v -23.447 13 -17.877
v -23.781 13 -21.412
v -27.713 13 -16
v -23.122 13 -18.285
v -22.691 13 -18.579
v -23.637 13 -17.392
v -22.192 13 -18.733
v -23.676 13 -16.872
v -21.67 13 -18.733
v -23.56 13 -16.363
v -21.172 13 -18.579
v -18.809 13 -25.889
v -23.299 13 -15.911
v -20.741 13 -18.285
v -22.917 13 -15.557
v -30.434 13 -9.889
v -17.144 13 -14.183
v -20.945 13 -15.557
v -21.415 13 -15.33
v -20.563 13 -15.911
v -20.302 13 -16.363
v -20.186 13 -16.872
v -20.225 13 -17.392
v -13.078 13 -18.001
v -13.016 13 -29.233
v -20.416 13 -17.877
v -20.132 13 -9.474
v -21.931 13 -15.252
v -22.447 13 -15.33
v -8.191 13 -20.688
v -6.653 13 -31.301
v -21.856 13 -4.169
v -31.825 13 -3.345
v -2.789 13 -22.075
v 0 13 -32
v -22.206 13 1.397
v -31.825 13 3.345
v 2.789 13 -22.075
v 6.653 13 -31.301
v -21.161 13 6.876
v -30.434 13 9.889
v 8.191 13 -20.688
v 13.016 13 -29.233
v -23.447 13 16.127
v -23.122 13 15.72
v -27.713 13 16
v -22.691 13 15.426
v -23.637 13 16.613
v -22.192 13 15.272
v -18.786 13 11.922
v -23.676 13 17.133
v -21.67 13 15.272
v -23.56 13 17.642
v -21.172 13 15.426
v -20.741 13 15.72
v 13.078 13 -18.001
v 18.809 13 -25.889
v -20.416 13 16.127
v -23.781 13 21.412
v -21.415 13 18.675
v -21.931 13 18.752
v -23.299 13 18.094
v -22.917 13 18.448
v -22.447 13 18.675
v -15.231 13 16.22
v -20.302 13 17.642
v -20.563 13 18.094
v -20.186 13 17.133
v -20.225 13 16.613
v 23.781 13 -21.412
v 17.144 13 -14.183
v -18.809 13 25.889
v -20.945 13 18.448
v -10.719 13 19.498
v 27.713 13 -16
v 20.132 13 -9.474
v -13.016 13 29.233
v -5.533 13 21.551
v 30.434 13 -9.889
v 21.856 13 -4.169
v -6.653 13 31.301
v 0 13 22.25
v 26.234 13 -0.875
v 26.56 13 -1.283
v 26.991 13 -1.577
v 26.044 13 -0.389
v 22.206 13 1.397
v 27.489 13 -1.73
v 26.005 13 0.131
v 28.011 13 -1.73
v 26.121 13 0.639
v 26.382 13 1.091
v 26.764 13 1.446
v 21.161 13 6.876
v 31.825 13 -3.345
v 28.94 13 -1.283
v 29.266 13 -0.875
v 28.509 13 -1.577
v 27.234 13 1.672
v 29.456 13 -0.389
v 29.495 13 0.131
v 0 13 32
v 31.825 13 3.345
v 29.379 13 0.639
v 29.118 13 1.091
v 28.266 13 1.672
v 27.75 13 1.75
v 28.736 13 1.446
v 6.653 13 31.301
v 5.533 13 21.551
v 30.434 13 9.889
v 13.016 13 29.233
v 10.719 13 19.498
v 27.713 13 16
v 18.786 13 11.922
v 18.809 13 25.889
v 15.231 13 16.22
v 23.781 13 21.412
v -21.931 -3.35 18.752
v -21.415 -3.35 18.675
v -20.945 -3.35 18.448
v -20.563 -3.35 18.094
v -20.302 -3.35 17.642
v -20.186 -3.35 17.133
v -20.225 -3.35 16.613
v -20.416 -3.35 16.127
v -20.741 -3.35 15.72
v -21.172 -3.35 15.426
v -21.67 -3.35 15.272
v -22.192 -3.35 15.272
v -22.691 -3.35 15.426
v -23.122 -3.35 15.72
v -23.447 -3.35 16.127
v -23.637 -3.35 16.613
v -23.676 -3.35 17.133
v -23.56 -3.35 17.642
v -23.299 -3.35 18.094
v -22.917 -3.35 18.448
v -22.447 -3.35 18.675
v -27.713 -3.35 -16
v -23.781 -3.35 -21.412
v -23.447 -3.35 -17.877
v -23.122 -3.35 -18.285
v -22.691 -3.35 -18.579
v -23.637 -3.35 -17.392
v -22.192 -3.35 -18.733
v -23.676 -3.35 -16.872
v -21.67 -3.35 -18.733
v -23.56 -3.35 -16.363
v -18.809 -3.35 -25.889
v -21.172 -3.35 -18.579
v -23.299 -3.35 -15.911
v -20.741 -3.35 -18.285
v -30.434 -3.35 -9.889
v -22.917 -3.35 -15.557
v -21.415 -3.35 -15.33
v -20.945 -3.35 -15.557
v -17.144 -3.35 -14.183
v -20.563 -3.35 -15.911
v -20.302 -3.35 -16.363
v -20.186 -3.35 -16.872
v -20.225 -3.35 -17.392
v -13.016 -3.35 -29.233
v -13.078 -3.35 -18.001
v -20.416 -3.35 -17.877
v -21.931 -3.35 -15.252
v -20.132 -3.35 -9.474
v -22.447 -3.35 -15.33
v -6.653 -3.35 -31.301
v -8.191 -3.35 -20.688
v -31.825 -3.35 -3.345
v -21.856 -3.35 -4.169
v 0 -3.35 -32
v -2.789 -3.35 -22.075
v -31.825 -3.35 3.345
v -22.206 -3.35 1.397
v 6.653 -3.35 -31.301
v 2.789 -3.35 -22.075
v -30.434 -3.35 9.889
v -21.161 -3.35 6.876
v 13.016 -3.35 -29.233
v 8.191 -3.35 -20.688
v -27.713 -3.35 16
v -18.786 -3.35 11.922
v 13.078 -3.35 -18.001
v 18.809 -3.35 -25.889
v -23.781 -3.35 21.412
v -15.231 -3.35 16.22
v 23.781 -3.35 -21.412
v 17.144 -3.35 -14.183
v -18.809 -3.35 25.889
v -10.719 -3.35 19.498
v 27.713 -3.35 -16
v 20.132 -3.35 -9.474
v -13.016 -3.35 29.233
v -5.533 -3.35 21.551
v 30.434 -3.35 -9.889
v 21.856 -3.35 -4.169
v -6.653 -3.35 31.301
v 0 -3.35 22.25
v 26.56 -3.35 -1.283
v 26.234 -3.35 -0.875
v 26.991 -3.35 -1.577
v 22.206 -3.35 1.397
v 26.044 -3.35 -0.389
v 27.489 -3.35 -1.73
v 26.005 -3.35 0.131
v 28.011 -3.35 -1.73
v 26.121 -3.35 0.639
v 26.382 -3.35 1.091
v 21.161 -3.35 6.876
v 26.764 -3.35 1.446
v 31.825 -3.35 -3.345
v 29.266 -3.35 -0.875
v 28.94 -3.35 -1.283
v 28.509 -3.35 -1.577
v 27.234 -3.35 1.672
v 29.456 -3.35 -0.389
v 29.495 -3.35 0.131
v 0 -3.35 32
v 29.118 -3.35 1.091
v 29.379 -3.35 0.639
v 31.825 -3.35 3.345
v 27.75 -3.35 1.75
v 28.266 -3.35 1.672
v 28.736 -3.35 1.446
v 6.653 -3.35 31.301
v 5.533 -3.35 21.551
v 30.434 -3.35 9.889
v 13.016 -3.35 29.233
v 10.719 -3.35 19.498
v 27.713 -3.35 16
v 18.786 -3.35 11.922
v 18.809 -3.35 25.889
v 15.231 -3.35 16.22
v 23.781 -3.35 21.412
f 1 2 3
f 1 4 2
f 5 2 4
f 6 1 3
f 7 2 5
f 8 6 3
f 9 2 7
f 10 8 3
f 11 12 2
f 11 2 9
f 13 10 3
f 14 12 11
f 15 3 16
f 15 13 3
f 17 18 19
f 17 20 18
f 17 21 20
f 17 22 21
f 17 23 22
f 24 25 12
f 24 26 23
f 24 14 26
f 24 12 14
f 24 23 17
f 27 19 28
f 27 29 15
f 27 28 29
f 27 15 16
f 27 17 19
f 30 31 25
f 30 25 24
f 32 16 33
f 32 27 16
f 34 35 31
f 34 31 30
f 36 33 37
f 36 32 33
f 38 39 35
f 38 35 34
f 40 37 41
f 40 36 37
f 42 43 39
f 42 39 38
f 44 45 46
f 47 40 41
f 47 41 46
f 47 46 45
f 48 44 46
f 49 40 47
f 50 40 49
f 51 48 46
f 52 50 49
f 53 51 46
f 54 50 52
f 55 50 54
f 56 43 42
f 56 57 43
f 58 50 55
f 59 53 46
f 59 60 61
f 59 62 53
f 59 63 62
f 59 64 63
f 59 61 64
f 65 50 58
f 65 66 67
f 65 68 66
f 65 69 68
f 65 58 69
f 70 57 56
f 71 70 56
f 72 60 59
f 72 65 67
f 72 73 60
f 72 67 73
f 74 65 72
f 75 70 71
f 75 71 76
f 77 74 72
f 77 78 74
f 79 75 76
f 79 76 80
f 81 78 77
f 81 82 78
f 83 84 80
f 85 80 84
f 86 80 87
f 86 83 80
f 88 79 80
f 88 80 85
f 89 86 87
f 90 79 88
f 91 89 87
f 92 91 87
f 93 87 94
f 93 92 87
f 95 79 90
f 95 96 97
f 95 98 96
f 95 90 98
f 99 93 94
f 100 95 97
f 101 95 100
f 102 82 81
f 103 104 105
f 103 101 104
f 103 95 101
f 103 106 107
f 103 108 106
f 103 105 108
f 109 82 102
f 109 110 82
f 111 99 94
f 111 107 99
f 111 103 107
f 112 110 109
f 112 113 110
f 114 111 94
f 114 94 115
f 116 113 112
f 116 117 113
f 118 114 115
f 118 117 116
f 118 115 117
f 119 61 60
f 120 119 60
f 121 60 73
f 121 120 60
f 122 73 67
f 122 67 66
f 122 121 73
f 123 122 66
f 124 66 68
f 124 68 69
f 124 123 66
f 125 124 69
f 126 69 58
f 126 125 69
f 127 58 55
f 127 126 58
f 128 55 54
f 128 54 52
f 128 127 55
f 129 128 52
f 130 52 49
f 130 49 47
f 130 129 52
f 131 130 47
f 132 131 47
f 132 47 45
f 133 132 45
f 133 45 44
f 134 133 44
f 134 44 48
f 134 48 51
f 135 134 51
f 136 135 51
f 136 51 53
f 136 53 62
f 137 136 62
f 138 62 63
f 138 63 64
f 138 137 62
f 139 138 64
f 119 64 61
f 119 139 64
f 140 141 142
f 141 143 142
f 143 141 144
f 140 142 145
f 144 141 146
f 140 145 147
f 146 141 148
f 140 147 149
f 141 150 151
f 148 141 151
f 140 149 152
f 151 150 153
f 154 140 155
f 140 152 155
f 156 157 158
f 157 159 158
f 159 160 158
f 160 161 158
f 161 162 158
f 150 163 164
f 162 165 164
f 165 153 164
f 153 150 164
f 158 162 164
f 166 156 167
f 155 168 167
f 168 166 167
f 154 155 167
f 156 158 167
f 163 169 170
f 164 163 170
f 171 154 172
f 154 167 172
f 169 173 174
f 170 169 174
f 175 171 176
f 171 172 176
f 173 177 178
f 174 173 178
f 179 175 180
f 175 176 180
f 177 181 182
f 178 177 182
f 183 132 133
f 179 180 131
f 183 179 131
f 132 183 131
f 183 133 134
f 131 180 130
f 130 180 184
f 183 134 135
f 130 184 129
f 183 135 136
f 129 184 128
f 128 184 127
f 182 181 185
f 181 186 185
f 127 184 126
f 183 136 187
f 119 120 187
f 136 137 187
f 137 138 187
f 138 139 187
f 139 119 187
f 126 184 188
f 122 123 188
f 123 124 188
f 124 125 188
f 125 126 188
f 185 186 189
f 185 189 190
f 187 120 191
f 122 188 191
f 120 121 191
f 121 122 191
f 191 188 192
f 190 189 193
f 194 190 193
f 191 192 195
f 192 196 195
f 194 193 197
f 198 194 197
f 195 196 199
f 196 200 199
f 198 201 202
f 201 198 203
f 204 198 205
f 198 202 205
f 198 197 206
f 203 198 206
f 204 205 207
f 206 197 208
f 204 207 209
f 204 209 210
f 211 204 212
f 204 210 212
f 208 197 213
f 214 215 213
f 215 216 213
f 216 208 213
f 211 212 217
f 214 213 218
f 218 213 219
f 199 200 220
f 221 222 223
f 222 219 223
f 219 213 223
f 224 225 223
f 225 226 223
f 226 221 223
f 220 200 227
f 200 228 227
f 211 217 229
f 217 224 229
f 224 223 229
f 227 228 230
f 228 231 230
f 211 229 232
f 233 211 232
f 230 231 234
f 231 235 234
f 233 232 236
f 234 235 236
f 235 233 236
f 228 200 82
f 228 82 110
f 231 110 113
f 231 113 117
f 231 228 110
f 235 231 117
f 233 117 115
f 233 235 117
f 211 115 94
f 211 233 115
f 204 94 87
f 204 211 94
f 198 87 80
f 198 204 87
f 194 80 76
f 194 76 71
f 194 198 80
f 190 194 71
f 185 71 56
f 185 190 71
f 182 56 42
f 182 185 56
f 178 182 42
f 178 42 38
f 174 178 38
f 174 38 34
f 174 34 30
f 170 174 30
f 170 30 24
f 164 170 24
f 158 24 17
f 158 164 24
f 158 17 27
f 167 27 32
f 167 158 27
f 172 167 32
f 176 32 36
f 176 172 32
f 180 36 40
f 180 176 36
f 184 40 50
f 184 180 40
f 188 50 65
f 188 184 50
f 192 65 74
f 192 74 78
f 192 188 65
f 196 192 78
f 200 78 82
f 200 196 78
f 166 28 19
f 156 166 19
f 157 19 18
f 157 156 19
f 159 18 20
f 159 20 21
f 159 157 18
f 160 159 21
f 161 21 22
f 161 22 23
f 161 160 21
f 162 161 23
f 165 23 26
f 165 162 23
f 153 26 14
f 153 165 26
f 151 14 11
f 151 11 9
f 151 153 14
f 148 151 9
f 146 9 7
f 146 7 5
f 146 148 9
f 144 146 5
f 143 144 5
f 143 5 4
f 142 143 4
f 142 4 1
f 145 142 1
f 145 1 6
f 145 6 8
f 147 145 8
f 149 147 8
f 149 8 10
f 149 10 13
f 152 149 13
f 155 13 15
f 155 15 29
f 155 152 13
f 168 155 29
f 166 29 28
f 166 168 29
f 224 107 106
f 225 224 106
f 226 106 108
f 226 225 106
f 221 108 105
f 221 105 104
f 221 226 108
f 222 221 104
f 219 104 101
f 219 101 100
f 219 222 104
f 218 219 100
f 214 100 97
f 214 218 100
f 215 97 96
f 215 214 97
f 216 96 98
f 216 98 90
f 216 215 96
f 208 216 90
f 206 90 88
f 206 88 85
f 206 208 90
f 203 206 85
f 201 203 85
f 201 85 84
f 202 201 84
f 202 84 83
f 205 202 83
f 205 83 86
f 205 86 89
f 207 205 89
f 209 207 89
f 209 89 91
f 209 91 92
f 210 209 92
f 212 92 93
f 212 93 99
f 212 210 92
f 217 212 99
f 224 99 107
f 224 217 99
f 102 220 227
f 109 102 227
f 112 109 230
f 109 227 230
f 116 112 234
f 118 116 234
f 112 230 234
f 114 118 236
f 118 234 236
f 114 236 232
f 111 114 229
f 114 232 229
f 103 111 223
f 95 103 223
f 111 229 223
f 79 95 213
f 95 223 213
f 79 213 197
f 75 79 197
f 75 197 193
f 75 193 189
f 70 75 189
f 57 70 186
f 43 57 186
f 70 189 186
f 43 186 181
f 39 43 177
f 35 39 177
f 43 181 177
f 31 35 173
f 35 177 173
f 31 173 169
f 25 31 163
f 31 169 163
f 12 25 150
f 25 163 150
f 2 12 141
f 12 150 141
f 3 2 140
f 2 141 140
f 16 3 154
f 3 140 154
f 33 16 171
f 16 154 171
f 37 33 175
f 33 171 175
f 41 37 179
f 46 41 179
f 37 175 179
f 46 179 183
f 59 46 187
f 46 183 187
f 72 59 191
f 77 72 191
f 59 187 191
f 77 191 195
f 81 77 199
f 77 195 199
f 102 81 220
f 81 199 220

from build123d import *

# Parameters (mm, degrees)
BOSS_EXTRUDE1_DEPTH      = 13
BOSS_EXTRUDE1_DEPTH_BACK = 3.35
SKETCH1_R                = 32
SKETCH1_R_2              = 22.25
SKETCH1_R_3              = 1.75


with BuildPart() as part:
    # Sketch1 → Boss-Extrude1 (new, two sides: drawn at the far end of the back side and taken through both)
    with BuildSketch(Plane(origin=(0, 0, 0), x_dir=(1, 0, 0), z_dir=(0, 1, 0)).offset(-BOSS_EXTRUDE1_DEPTH_BACK)):
        with Locations(Location((0, 0, 0), (0, 0, 270))):
            Circle(SKETCH1_R)
        with Locations(Location((0, 0, 0), (0, 0, 270))):
            Circle(SKETCH1_R_2, mode=Mode.SUBTRACT)
        with Locations(Location((27.75, 0, 0), (0, 0, 270))):
            Circle(SKETCH1_R_3, mode=Mode.SUBTRACT)
        with Locations(Location((-21.931253571, 17.002429733, 0), (0, 0, 270))):
            Circle(SKETCH1_R_3, mode=Mode.SUBTRACT)
        with Locations(Location((-21.931253571, -17.002429733, 0), (0, 0, 270))):
            Circle(SKETCH1_R_3, mode=Mode.SUBTRACT)
    extrude(amount=BOSS_EXTRUDE1_DEPTH + BOSS_EXTRUDE1_DEPTH_BACK)


solid = part.part
